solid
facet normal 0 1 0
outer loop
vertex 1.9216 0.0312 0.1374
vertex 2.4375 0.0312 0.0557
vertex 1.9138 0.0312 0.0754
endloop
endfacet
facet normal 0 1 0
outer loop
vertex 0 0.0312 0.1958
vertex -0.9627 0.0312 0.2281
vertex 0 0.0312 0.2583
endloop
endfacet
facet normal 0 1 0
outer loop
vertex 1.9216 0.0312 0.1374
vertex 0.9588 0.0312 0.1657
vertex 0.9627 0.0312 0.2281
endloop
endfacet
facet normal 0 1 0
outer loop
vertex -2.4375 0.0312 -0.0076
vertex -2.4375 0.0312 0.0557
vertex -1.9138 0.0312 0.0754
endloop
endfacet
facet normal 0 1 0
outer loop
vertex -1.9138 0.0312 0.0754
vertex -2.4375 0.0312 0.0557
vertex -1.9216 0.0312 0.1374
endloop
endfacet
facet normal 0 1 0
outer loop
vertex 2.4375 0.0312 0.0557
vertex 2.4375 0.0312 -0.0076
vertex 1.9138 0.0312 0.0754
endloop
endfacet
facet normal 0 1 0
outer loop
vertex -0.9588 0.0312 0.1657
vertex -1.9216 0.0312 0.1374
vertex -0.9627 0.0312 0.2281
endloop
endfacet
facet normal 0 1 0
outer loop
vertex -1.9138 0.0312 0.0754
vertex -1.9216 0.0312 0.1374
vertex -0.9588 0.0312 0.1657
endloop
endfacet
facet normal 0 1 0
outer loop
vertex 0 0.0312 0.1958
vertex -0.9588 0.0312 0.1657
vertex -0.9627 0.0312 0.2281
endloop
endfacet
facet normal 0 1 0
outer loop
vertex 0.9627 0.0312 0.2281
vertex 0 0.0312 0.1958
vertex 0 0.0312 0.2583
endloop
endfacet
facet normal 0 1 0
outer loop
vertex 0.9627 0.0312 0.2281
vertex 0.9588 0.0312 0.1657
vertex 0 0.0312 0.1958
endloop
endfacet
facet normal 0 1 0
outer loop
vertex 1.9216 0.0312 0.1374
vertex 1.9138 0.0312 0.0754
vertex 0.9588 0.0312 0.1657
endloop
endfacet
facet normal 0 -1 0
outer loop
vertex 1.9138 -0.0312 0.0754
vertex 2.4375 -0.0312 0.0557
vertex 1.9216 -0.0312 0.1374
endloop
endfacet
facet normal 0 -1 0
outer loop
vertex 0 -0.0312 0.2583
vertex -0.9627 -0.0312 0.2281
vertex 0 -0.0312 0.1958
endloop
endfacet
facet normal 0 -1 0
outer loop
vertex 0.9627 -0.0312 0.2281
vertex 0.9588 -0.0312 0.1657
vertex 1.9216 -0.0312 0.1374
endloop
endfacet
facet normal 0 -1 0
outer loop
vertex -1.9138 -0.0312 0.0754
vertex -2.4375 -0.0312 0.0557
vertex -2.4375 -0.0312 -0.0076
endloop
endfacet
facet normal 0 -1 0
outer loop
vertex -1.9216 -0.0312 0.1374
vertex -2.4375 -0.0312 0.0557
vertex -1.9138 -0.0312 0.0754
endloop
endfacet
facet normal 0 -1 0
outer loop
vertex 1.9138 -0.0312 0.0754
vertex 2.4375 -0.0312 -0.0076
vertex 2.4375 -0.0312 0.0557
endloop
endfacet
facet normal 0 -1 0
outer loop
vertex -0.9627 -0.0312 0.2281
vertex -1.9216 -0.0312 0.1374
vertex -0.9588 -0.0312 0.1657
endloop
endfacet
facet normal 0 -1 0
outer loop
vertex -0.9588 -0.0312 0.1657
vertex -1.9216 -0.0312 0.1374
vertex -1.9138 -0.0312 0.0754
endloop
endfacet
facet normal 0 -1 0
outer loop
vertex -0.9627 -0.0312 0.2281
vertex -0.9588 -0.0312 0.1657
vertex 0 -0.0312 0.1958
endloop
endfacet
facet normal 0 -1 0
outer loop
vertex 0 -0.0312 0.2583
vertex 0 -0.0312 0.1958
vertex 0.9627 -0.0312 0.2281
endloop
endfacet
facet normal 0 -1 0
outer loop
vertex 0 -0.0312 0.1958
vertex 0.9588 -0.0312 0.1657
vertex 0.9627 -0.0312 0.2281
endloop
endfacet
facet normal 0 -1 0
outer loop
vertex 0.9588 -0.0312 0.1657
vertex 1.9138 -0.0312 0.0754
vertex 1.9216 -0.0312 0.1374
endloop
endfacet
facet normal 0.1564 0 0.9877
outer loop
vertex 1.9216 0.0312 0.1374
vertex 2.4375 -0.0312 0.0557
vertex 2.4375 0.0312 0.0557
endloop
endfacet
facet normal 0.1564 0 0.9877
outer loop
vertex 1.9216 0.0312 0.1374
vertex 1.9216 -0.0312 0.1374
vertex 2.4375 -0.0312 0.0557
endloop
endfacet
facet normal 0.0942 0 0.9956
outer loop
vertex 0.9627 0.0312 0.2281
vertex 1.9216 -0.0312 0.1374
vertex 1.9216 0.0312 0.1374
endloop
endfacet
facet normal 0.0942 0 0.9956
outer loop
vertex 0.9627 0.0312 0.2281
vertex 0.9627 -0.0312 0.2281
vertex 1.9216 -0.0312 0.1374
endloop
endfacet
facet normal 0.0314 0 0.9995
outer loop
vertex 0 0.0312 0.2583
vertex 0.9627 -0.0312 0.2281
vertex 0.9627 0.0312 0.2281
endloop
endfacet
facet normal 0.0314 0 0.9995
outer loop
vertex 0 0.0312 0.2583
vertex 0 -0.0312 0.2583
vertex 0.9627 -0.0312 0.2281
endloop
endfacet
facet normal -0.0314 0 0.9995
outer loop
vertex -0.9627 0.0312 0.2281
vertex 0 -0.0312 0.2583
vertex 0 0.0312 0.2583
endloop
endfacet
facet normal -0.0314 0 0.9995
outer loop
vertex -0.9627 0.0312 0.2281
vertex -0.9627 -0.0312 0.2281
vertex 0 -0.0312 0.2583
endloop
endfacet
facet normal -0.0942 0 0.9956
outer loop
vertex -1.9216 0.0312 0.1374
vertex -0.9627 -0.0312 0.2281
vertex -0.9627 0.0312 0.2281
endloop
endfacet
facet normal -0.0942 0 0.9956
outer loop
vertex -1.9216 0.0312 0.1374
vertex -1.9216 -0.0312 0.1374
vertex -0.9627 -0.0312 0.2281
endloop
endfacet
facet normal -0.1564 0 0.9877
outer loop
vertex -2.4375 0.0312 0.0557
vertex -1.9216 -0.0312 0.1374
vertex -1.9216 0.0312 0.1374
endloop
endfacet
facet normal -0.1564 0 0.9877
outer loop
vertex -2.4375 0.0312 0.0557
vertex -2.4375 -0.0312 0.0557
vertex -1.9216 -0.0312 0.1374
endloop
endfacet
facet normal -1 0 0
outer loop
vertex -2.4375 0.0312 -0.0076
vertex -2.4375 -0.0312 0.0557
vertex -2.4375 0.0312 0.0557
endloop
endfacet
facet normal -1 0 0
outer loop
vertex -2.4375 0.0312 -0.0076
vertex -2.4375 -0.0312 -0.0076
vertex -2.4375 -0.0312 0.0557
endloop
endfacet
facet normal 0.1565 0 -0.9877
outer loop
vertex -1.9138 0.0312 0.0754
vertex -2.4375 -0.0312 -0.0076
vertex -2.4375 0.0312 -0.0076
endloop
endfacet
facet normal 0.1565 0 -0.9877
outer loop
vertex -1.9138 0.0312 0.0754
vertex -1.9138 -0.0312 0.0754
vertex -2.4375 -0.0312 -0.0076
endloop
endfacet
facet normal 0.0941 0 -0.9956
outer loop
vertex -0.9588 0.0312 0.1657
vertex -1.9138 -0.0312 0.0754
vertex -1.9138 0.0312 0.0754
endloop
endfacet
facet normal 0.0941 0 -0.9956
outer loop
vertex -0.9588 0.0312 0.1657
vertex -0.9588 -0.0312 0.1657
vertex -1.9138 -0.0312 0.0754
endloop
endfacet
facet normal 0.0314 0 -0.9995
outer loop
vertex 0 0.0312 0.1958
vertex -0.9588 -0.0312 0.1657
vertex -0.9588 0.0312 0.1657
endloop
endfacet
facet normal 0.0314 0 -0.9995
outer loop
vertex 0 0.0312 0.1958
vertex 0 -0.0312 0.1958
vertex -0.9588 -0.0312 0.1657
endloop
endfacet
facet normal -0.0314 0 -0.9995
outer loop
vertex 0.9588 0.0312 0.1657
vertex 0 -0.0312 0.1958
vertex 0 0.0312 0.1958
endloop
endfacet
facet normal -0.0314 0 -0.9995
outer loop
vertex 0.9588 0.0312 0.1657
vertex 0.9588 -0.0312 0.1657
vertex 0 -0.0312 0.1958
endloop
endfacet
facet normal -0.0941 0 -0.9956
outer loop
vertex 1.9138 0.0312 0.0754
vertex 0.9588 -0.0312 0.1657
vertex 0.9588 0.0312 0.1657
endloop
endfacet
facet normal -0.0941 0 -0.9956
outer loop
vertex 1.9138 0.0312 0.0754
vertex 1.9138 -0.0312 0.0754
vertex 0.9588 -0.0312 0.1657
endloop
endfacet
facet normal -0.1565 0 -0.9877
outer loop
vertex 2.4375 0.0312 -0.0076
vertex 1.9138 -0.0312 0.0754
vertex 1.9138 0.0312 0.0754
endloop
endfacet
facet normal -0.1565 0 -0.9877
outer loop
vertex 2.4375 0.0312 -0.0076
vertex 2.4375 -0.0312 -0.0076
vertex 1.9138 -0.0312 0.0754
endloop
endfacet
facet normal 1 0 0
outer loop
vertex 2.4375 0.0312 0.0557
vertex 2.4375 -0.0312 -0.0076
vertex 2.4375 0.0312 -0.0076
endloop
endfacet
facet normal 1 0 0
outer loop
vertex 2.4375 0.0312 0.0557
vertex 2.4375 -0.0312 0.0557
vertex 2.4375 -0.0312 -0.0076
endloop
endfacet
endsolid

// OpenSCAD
// file: MMlib/MMlib/MMlib/circle_strip.scad
//#####################################
// circle_strip
// (c) 2021 - Roie R. Black
//=====================================
$fn = 100;


module circle_strip(r=3, t=0.5) {
  difference() {
    circle(r);
    circle(r-t);
  }
}

circular_strip();
// file: MMlib/MMlib/rib_strip.scad
//#####################################
// rib_strip
// (c) 2021 - Roie R. Black
//=====================================
$fn = 100;
use <MMlib/circle_strip.scad>

module rib_strip(r=3, w=4, t=0.5) {
  dy = sqrt((r-t)*(r-t) - (w/2)*(w/2));
    translate([0,-dy])
      intersection() {
        circle_strip(r,t);
        translate([-w/2,0])
          square([w,2*r]);
      }
}

rib_strip();
// file: ../../MMlib/functions.scad
// functions.scad

// given angle and length, return offset
function delta(ang, l)  = l / cos(ang);

// given chord nd camber, return radius
function radius(ch, ca) = ch * ch /(8 * ca * ch/100) + ca*ch/100/2;

// given two offsets s apart, return offset at 0<= x <=s
function cx0(x,c1,c2,s) = c1 + (c2-c1)/s * x;

// apply rotation, then translation
module align(d)
  translate([d[0],d[1],d[2]])
    rotate([d[3],d[4],d[5]]) children();

module position(d)
  translate([d[0],d[1],d[2]]) children();
// file: ../../../constraints.scad
//####################################
// Math-Magik LPP - Design Constraints
// (c) 2021 by Roie R. Black
//====================================

// AMA Rules for event 208
//------------------------------------

max_overall_length = 20;
max_projected_wing_span = 18;
max_bearing_to_rear_hook = 10;
max_wing_chord = 5;
max_stab_span = 12;
max_stab_chord = 4;
max_prop_diameter = 12;
// file: MMlib/functions.scad
// functions.scad

// given angle and length, return offset
function delta(ang, l)  = l / cos(ang);

// given chord nd camber, return radius
function radius(ch, ca) = ch * ch /(8 * ca * ch/100) + ca*ch/100/2;

// given two offsets s apart, return offset at 0<= x <=s
function cx0(x,c1,c2,s) = c1 + (c2-c1)/s * x;

// apply rotation, then translation
module align(d)
  translate([d[0],d[1],d[2]])
    rotate([d[3],d[4],d[5]]) children();

module position(d)
  translate([d[0],d[1],d[2]]) children();
// file: MMlib/straight_rib.scad
//#####################################
// straight_rib
// (c) 2021 - Roie R. Black
//=====================================
$fn = 100;

use <MMlib/rib_strip.scad>

module straight_rib(r=3, w=4, t=0.5, h=0.5) {
  translate([0,t/2,0])
    rotate([90,0,0])
      linear_extrude(height = t)
        rib_strip(r,w,h);
}


straight_rib();
// file: ../../wing-data.scad
//#####################################
// wing-data.scad
// (c) 2021 by Roie R. Black
//=====================================
include <../constraints.scad>
include <MMlib/functions.scad>


center_span = 12;
chord = max_wing_chord;
camber = 4;
num_center_ribs = 5;
spar_size = 1/16;

tip_dihedral = 1.75;
radius = 2;


//=====================================
// calculated values
tip_projected_span = (max_projected_wing_span - center_span)/2;
tip_angle = atan2(tip_dihedral, tip_projected_span);
tip_span = tip_projected_span/cos(tip_angle);

rib_spacing = center_span / num_center_ribs;

r1c = chord - 2 * spar_size;
r1y = -center_span/2 + spar_size/2;

r2c = r1c;
r2y = -center_span/4 + spar_size/2;

r3c = r1c;
r3y = 0;

r4c = r2c;
r4y = -r2y;

r5c = r1c;
r5y = -r1y;

rib_radius = radius(r1c, camber);


//==========================================
// wing positioning data

pos1 = [0,center_span/2,0,180+tip_angle,0,0];
pos2 = [0,-center_span/2,0,-tip_angle,0,0];
pos3 = [-1/32-1/64,0,-1/32];
pos4 = [5+1/32+1/64,0,-1/32];
// main file
//###################################################
// rib1.scad
// (c) 2021 - Roie R. Black
//***************************************************
include <../../wing-data.scad>

use <MMlib/straight_rib.scad>
use <MMlib/functions.scad>

module rib1() {
    straight_rib(rib_radius, r1c, spar_size, spar_size);
}

rib1();
